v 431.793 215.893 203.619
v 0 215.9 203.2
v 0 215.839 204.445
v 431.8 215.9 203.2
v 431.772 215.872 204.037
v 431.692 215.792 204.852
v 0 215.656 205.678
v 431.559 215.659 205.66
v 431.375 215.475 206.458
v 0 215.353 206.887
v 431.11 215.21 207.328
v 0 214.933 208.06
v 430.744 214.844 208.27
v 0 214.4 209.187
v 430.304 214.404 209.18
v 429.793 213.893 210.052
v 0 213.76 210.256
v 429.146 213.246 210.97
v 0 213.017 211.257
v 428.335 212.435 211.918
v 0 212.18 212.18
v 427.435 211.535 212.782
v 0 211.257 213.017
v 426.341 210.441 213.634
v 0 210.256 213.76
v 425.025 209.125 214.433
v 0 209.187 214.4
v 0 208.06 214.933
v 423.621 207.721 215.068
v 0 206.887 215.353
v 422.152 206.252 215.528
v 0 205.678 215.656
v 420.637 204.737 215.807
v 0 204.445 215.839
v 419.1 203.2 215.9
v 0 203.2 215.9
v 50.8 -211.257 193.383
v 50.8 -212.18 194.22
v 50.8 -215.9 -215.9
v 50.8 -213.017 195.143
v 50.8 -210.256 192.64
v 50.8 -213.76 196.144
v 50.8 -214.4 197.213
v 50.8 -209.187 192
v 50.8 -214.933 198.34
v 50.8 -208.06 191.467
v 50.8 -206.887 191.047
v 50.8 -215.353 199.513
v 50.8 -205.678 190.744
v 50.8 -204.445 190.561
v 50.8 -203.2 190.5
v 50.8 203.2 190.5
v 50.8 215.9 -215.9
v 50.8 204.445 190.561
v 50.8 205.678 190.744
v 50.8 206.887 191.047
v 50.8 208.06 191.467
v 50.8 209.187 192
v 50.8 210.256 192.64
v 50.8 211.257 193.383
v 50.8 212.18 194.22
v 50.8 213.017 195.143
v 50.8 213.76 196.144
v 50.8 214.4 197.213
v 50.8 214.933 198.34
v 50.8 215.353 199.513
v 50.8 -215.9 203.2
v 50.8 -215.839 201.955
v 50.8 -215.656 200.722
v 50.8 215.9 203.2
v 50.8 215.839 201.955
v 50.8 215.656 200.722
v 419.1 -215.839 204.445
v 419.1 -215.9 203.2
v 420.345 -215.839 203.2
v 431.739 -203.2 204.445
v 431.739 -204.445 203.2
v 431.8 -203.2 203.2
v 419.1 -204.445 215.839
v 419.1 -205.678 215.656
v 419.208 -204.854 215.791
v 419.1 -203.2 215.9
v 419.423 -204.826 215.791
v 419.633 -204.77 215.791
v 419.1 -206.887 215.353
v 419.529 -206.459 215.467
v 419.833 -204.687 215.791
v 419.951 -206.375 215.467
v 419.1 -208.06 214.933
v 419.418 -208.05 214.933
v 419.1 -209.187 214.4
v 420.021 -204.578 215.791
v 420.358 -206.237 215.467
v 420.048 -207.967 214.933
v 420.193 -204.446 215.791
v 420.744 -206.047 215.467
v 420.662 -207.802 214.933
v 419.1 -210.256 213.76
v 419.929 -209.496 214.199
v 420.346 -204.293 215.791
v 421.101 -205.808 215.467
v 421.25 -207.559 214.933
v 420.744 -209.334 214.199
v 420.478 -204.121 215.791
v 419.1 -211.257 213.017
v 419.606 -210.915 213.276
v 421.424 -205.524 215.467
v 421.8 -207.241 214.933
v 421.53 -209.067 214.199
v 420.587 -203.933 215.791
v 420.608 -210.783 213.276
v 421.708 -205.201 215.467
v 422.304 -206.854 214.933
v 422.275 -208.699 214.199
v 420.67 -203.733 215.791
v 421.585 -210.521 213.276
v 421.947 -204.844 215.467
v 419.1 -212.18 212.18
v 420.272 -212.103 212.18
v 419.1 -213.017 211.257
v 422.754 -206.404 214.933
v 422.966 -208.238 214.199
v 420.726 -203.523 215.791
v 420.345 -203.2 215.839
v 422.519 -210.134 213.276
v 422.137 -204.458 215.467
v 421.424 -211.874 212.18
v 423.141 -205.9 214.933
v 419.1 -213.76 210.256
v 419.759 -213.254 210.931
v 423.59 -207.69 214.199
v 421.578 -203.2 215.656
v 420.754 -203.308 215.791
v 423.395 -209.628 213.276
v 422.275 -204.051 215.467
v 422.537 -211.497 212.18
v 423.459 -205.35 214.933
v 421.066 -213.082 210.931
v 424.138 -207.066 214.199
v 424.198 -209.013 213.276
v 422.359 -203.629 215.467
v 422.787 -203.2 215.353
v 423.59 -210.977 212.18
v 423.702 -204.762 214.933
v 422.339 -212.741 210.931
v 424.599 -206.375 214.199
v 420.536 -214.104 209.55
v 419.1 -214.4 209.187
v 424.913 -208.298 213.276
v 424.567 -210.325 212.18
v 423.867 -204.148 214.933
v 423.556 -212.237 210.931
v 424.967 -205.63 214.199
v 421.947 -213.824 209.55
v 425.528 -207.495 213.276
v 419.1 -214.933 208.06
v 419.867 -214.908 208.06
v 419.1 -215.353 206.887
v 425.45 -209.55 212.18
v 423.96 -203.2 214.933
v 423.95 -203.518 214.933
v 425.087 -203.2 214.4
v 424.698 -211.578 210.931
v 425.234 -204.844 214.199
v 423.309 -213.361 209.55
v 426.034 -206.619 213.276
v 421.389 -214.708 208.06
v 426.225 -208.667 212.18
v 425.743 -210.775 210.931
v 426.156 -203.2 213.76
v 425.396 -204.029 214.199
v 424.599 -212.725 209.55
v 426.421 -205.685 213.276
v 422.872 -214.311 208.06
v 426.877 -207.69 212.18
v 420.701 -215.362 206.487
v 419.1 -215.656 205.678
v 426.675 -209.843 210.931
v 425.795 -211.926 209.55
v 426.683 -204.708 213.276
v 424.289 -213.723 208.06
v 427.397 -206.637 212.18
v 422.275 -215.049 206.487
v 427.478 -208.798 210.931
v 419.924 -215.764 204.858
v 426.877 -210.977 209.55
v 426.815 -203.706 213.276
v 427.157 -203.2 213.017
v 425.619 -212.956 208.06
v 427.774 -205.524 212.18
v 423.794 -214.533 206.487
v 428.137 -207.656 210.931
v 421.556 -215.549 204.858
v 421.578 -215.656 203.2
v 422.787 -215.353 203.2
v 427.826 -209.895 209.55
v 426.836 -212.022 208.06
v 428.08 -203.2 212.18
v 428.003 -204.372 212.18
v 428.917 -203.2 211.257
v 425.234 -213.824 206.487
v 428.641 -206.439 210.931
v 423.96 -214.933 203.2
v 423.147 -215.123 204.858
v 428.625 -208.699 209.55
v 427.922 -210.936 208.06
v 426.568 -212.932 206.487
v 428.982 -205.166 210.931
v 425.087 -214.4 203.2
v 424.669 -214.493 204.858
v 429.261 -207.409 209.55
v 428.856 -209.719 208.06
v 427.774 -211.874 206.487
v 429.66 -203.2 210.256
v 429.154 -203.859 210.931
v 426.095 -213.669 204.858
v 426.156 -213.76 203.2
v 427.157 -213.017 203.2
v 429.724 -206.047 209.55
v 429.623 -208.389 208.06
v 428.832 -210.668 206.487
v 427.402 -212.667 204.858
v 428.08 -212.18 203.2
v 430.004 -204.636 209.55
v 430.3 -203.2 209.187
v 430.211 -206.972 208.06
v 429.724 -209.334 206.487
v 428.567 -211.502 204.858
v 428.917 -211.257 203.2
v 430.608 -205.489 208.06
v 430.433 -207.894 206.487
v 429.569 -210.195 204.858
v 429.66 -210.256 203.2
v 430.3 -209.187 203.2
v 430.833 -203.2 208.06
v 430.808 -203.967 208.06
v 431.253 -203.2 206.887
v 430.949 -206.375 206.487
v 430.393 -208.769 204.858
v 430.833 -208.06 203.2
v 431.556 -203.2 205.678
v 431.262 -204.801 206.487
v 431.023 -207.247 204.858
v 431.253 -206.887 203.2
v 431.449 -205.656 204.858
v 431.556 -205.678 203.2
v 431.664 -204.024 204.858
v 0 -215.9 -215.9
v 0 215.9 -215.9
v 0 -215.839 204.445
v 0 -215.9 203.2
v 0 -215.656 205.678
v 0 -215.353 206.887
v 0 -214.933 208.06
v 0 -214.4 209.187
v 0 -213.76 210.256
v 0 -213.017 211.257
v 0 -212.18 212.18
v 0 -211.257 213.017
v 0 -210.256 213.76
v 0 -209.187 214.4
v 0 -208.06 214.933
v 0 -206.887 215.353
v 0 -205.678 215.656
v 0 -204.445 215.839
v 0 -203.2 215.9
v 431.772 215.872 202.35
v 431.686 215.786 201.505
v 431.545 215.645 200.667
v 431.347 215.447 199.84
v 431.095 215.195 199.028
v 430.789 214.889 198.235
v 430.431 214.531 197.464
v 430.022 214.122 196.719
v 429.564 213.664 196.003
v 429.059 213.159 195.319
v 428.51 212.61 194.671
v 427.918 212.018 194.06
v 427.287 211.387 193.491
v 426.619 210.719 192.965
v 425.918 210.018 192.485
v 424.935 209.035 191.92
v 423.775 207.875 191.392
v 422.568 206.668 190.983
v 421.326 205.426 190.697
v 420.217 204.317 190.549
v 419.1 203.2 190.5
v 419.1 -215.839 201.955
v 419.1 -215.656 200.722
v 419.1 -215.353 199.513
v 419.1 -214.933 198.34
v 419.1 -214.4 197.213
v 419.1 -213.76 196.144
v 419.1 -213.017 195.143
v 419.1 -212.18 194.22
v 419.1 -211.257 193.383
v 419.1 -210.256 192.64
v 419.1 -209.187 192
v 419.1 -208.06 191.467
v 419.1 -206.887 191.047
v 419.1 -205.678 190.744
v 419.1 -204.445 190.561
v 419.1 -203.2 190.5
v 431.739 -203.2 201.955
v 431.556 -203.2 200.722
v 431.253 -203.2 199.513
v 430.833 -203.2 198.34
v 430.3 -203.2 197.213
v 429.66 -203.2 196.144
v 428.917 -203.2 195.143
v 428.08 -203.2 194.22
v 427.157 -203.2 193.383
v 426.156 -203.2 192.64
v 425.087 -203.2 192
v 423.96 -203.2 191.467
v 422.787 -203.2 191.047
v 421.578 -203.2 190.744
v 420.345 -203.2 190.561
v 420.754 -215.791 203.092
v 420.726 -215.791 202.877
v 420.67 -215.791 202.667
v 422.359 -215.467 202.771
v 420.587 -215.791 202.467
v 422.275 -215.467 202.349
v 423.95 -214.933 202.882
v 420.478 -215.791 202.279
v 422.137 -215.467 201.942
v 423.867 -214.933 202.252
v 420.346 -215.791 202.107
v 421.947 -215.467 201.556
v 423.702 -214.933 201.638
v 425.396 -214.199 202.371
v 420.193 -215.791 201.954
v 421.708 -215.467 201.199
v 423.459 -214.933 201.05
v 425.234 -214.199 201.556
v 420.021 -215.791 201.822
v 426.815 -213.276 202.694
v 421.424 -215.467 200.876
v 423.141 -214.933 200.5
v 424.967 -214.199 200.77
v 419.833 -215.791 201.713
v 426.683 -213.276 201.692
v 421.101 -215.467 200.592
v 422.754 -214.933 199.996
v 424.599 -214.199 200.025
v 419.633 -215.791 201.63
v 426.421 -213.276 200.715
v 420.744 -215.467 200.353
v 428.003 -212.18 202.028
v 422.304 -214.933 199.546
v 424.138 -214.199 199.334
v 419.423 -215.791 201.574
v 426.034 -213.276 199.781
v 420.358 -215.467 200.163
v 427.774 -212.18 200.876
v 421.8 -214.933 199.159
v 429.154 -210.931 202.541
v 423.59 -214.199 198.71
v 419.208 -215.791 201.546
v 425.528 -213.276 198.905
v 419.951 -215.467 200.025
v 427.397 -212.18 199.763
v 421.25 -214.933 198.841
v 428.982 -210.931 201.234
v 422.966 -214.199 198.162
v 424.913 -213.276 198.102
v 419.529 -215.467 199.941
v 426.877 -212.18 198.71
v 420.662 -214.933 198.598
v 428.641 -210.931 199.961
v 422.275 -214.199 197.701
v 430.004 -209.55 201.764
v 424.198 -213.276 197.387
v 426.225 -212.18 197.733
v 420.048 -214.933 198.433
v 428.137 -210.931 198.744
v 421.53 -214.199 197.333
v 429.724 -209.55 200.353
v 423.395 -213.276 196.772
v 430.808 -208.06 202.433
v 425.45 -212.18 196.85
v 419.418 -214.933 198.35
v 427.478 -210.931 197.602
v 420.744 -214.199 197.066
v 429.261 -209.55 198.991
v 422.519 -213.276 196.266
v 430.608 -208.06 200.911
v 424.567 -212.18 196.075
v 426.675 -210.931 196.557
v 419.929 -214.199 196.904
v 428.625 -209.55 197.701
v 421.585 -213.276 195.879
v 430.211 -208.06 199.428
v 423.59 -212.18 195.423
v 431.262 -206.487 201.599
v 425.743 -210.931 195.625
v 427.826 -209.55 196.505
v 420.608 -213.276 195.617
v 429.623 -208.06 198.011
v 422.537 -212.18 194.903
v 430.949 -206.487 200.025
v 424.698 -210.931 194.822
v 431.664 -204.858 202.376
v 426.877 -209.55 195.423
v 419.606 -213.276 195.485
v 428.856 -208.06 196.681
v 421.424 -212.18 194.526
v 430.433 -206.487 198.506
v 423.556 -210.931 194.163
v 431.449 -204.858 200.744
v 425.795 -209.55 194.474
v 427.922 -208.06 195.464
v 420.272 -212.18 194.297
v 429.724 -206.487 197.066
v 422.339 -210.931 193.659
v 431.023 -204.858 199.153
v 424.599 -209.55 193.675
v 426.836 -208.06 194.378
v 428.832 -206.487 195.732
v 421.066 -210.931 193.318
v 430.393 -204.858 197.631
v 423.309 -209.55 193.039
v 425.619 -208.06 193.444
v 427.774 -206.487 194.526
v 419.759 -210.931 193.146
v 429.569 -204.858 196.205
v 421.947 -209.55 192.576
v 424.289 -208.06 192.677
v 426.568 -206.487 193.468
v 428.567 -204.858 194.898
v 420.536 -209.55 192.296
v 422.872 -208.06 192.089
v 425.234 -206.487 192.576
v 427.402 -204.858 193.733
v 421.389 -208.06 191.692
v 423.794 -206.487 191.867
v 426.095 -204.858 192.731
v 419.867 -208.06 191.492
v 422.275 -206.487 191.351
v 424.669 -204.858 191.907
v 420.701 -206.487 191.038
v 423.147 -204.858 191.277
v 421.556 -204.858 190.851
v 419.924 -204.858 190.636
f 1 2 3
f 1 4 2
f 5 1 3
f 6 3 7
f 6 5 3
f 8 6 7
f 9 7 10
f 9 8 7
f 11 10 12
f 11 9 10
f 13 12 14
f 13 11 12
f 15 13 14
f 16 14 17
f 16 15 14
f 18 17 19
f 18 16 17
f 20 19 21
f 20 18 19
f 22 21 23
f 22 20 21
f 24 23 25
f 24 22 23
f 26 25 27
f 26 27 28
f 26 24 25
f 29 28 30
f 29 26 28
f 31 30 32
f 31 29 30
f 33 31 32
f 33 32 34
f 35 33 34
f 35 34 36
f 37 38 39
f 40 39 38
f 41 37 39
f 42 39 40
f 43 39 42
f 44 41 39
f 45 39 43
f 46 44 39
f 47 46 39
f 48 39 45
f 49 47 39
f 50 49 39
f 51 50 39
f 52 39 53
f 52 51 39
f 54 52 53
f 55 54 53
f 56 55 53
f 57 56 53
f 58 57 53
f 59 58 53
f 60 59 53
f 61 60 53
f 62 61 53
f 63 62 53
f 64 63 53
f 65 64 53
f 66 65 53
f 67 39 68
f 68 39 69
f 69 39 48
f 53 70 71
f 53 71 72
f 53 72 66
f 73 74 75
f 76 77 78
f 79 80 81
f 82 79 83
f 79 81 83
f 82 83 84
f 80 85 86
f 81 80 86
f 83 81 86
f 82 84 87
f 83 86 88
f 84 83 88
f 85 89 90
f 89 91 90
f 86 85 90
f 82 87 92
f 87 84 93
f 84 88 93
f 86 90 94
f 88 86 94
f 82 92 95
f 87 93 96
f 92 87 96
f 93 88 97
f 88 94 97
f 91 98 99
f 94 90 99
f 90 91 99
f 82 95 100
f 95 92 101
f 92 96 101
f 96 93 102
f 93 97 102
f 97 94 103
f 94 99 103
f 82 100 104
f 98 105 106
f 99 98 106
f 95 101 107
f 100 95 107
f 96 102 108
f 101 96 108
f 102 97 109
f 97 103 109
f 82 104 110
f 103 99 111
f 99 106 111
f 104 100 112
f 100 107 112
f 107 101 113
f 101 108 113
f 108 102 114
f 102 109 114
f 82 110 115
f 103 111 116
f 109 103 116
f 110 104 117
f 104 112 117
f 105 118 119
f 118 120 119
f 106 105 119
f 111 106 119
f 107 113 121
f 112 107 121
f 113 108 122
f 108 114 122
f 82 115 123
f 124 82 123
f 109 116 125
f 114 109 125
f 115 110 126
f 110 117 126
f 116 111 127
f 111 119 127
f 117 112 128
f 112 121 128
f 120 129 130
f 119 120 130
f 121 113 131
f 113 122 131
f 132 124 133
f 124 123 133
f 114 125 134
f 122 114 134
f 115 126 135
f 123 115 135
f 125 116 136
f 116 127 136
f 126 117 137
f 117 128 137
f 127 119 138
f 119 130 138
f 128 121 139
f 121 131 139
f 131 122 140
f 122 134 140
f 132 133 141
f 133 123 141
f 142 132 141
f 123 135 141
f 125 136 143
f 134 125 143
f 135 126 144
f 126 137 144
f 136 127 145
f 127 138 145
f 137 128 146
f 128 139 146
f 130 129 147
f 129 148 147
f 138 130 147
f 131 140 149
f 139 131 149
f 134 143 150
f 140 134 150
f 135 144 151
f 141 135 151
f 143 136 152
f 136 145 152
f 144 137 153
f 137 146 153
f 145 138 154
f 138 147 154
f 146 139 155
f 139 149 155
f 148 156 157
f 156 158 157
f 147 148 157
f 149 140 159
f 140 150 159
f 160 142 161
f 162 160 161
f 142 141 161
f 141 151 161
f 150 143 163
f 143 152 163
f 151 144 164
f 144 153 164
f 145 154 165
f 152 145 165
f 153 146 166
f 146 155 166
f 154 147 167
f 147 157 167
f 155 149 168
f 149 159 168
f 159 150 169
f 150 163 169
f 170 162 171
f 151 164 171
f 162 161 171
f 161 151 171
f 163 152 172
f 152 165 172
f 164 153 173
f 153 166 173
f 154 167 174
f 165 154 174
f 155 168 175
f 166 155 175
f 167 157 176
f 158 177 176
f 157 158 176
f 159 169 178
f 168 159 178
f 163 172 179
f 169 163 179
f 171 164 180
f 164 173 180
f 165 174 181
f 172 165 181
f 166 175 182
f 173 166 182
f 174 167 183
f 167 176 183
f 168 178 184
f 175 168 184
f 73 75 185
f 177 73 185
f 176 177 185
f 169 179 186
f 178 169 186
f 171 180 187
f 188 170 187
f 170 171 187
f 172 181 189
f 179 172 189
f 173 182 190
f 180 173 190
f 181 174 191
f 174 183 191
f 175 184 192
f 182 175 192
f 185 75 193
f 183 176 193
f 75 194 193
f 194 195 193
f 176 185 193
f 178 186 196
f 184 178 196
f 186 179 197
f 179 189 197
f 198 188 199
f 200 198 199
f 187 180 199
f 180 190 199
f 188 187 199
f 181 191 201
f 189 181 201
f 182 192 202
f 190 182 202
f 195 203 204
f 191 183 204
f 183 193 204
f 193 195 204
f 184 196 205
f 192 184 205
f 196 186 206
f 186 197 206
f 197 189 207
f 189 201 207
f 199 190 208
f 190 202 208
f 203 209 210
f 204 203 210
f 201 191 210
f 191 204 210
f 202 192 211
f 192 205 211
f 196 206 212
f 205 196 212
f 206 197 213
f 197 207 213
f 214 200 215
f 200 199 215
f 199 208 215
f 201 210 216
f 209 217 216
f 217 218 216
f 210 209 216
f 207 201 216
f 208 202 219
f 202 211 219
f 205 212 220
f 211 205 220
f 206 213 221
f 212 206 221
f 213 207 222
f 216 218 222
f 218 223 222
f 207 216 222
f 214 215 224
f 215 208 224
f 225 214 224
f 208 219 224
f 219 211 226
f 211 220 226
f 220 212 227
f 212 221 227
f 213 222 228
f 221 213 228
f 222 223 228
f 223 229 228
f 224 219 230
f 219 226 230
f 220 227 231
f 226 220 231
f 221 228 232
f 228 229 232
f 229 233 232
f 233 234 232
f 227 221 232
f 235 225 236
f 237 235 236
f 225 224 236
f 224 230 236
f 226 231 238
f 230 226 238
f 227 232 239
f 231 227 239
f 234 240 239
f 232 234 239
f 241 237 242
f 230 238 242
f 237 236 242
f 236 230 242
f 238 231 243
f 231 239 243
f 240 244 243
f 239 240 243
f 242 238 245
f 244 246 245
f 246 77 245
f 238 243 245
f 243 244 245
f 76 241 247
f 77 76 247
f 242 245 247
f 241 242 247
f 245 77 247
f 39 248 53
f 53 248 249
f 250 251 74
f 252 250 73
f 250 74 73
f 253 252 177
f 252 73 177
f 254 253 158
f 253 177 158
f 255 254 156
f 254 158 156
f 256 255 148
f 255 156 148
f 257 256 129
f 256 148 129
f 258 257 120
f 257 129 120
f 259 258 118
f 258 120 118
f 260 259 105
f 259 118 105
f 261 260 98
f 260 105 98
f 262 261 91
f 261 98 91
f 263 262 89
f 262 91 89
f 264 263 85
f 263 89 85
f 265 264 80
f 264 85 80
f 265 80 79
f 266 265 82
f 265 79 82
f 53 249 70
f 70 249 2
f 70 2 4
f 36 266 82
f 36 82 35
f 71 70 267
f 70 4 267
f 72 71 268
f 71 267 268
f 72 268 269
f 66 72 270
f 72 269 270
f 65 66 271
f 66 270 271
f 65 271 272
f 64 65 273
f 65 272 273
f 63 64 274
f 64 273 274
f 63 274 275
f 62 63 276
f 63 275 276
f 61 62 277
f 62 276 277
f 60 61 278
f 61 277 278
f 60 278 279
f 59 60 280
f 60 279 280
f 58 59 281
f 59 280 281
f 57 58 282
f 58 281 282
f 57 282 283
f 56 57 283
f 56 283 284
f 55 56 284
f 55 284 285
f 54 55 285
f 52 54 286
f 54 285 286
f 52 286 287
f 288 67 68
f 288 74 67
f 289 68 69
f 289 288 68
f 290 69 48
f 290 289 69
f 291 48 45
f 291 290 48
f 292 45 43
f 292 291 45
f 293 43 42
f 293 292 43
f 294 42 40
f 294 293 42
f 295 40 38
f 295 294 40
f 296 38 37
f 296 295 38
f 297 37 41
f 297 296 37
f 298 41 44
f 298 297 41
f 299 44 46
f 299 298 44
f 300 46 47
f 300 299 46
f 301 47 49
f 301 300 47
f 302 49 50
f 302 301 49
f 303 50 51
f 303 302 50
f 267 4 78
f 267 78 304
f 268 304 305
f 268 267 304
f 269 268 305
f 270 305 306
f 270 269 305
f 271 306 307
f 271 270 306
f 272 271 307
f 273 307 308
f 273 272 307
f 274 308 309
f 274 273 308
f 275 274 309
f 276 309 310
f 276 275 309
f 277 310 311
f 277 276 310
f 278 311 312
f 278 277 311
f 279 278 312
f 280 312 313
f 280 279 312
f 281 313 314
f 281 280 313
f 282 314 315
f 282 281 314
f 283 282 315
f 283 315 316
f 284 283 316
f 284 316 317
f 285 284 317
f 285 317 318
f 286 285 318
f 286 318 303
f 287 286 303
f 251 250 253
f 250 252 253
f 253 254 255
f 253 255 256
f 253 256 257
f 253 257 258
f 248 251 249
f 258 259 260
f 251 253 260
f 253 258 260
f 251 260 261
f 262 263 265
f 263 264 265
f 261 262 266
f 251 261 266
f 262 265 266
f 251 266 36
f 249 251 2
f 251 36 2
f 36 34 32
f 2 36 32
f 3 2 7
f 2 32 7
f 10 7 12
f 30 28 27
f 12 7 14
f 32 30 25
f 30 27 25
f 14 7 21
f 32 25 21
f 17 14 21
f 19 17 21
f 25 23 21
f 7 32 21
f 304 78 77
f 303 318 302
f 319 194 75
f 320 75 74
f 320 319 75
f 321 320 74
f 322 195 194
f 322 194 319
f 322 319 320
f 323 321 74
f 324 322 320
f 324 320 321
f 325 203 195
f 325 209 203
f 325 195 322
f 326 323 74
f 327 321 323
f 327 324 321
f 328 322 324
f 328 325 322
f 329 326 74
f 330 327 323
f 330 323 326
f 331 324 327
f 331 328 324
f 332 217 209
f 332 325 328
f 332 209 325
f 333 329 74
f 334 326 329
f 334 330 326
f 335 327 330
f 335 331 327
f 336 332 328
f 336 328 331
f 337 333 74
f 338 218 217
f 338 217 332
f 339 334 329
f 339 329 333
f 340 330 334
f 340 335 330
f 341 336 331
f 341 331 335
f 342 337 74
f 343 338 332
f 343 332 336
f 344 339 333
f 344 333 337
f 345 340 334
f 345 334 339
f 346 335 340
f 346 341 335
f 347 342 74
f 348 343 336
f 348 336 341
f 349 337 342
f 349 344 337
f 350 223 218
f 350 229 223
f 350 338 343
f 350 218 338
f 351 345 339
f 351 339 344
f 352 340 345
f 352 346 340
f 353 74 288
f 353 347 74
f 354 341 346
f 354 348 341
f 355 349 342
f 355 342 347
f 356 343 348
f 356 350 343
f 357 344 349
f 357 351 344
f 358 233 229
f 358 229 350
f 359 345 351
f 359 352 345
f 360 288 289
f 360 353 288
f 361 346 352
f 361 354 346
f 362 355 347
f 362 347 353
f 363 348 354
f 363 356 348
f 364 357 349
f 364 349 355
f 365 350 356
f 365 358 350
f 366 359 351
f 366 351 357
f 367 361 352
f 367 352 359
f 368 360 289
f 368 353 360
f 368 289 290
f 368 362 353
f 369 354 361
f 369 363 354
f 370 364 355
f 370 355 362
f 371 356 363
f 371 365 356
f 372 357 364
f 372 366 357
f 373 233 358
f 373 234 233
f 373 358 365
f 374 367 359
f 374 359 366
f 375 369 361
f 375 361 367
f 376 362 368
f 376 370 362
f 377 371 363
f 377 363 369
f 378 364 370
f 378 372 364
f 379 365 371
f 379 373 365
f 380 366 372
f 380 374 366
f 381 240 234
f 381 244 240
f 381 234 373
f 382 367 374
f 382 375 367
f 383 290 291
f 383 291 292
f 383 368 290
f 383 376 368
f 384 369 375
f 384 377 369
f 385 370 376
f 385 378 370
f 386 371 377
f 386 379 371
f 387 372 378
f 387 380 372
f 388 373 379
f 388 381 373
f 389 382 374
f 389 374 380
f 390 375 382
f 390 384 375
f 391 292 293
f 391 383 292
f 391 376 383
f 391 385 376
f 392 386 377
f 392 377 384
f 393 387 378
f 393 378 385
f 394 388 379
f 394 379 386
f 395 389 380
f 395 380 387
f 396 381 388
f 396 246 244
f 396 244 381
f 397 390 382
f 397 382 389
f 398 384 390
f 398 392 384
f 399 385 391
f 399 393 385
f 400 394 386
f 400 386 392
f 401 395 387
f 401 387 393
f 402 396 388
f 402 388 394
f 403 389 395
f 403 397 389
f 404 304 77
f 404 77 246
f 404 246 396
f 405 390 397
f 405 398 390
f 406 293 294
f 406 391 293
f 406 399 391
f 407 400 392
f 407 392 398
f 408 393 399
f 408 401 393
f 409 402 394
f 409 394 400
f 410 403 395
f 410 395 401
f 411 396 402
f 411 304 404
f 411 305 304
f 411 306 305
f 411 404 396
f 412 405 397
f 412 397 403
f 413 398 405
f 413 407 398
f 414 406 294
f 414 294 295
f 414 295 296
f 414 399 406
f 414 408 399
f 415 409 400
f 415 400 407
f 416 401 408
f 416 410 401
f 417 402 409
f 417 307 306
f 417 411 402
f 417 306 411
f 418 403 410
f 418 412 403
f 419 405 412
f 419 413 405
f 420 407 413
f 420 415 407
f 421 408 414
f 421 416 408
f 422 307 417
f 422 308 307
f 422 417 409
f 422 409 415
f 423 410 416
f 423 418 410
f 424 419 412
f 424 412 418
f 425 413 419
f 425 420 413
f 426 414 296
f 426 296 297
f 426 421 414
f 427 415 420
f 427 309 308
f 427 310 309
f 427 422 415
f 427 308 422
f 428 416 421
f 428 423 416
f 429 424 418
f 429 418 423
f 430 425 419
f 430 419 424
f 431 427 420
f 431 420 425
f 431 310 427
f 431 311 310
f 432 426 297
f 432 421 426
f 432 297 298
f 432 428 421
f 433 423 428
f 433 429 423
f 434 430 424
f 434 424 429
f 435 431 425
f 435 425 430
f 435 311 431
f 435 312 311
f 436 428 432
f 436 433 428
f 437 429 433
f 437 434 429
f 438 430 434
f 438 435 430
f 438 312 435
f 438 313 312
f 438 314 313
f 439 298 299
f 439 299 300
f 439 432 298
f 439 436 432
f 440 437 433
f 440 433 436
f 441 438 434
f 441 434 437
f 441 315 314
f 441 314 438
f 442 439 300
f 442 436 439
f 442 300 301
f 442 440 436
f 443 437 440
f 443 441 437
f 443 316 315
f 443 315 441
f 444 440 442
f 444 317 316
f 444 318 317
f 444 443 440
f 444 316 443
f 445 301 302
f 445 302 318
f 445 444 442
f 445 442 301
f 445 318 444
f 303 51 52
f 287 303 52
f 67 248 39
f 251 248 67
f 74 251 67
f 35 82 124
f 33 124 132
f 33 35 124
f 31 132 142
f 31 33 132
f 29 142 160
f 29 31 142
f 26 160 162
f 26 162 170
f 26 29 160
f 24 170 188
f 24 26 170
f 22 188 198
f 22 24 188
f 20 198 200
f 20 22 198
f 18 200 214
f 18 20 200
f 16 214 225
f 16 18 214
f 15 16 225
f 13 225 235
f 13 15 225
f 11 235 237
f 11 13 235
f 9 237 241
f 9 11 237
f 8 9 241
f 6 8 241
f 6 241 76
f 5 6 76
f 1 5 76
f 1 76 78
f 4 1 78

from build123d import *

# Parameters (mm, degrees)
F0_W     = 431.8
F0_H     = 25.4
F1_DEPTH = 431.8
F0_H_2   = 406.4
F2_DEPTH = 50.8
F3_R     = 12.69999


# Not quite as in the source:
# - a fillet or chamfer is up to 0.001 mm smaller than in the source, because OpenCascade refuses the exact size


with BuildPart() as f1:
    # F0 (on Right) → F1 (new body)
    with BuildSketch(Plane.YZ):
        with Locations((0, 203.2)):
            Rectangle(F0_W, F0_H)
    extrude(amount=F1_DEPTH)

    # F0 (on Right) → F2 (join)
    with BuildSketch(Plane.YZ):
        with Locations((0, -12.7)):
            Rectangle(F0_W, F0_H_2)
    extrude(amount=F2_DEPTH)

    # F3 (radius 12.7 in the source; OpenCascade refuses exactly that, so slightly less here)
    f3_edges = [f1.edges().sort_by_distance(p)[0] for p in [
        (431.8, 0, 190.5),
        (431.8, -215.9, 203.2),
        (241.3, -215.9, 190.5),
        (215.9, -215.9, 215.9),
        (431.8, 0, 215.9),
        (215.9, 215.9, 215.9),
        (241.3, 215.9, 190.5),
    ]]
    fillet(f3_edges, radius=F3_R)


solid = f1.part
